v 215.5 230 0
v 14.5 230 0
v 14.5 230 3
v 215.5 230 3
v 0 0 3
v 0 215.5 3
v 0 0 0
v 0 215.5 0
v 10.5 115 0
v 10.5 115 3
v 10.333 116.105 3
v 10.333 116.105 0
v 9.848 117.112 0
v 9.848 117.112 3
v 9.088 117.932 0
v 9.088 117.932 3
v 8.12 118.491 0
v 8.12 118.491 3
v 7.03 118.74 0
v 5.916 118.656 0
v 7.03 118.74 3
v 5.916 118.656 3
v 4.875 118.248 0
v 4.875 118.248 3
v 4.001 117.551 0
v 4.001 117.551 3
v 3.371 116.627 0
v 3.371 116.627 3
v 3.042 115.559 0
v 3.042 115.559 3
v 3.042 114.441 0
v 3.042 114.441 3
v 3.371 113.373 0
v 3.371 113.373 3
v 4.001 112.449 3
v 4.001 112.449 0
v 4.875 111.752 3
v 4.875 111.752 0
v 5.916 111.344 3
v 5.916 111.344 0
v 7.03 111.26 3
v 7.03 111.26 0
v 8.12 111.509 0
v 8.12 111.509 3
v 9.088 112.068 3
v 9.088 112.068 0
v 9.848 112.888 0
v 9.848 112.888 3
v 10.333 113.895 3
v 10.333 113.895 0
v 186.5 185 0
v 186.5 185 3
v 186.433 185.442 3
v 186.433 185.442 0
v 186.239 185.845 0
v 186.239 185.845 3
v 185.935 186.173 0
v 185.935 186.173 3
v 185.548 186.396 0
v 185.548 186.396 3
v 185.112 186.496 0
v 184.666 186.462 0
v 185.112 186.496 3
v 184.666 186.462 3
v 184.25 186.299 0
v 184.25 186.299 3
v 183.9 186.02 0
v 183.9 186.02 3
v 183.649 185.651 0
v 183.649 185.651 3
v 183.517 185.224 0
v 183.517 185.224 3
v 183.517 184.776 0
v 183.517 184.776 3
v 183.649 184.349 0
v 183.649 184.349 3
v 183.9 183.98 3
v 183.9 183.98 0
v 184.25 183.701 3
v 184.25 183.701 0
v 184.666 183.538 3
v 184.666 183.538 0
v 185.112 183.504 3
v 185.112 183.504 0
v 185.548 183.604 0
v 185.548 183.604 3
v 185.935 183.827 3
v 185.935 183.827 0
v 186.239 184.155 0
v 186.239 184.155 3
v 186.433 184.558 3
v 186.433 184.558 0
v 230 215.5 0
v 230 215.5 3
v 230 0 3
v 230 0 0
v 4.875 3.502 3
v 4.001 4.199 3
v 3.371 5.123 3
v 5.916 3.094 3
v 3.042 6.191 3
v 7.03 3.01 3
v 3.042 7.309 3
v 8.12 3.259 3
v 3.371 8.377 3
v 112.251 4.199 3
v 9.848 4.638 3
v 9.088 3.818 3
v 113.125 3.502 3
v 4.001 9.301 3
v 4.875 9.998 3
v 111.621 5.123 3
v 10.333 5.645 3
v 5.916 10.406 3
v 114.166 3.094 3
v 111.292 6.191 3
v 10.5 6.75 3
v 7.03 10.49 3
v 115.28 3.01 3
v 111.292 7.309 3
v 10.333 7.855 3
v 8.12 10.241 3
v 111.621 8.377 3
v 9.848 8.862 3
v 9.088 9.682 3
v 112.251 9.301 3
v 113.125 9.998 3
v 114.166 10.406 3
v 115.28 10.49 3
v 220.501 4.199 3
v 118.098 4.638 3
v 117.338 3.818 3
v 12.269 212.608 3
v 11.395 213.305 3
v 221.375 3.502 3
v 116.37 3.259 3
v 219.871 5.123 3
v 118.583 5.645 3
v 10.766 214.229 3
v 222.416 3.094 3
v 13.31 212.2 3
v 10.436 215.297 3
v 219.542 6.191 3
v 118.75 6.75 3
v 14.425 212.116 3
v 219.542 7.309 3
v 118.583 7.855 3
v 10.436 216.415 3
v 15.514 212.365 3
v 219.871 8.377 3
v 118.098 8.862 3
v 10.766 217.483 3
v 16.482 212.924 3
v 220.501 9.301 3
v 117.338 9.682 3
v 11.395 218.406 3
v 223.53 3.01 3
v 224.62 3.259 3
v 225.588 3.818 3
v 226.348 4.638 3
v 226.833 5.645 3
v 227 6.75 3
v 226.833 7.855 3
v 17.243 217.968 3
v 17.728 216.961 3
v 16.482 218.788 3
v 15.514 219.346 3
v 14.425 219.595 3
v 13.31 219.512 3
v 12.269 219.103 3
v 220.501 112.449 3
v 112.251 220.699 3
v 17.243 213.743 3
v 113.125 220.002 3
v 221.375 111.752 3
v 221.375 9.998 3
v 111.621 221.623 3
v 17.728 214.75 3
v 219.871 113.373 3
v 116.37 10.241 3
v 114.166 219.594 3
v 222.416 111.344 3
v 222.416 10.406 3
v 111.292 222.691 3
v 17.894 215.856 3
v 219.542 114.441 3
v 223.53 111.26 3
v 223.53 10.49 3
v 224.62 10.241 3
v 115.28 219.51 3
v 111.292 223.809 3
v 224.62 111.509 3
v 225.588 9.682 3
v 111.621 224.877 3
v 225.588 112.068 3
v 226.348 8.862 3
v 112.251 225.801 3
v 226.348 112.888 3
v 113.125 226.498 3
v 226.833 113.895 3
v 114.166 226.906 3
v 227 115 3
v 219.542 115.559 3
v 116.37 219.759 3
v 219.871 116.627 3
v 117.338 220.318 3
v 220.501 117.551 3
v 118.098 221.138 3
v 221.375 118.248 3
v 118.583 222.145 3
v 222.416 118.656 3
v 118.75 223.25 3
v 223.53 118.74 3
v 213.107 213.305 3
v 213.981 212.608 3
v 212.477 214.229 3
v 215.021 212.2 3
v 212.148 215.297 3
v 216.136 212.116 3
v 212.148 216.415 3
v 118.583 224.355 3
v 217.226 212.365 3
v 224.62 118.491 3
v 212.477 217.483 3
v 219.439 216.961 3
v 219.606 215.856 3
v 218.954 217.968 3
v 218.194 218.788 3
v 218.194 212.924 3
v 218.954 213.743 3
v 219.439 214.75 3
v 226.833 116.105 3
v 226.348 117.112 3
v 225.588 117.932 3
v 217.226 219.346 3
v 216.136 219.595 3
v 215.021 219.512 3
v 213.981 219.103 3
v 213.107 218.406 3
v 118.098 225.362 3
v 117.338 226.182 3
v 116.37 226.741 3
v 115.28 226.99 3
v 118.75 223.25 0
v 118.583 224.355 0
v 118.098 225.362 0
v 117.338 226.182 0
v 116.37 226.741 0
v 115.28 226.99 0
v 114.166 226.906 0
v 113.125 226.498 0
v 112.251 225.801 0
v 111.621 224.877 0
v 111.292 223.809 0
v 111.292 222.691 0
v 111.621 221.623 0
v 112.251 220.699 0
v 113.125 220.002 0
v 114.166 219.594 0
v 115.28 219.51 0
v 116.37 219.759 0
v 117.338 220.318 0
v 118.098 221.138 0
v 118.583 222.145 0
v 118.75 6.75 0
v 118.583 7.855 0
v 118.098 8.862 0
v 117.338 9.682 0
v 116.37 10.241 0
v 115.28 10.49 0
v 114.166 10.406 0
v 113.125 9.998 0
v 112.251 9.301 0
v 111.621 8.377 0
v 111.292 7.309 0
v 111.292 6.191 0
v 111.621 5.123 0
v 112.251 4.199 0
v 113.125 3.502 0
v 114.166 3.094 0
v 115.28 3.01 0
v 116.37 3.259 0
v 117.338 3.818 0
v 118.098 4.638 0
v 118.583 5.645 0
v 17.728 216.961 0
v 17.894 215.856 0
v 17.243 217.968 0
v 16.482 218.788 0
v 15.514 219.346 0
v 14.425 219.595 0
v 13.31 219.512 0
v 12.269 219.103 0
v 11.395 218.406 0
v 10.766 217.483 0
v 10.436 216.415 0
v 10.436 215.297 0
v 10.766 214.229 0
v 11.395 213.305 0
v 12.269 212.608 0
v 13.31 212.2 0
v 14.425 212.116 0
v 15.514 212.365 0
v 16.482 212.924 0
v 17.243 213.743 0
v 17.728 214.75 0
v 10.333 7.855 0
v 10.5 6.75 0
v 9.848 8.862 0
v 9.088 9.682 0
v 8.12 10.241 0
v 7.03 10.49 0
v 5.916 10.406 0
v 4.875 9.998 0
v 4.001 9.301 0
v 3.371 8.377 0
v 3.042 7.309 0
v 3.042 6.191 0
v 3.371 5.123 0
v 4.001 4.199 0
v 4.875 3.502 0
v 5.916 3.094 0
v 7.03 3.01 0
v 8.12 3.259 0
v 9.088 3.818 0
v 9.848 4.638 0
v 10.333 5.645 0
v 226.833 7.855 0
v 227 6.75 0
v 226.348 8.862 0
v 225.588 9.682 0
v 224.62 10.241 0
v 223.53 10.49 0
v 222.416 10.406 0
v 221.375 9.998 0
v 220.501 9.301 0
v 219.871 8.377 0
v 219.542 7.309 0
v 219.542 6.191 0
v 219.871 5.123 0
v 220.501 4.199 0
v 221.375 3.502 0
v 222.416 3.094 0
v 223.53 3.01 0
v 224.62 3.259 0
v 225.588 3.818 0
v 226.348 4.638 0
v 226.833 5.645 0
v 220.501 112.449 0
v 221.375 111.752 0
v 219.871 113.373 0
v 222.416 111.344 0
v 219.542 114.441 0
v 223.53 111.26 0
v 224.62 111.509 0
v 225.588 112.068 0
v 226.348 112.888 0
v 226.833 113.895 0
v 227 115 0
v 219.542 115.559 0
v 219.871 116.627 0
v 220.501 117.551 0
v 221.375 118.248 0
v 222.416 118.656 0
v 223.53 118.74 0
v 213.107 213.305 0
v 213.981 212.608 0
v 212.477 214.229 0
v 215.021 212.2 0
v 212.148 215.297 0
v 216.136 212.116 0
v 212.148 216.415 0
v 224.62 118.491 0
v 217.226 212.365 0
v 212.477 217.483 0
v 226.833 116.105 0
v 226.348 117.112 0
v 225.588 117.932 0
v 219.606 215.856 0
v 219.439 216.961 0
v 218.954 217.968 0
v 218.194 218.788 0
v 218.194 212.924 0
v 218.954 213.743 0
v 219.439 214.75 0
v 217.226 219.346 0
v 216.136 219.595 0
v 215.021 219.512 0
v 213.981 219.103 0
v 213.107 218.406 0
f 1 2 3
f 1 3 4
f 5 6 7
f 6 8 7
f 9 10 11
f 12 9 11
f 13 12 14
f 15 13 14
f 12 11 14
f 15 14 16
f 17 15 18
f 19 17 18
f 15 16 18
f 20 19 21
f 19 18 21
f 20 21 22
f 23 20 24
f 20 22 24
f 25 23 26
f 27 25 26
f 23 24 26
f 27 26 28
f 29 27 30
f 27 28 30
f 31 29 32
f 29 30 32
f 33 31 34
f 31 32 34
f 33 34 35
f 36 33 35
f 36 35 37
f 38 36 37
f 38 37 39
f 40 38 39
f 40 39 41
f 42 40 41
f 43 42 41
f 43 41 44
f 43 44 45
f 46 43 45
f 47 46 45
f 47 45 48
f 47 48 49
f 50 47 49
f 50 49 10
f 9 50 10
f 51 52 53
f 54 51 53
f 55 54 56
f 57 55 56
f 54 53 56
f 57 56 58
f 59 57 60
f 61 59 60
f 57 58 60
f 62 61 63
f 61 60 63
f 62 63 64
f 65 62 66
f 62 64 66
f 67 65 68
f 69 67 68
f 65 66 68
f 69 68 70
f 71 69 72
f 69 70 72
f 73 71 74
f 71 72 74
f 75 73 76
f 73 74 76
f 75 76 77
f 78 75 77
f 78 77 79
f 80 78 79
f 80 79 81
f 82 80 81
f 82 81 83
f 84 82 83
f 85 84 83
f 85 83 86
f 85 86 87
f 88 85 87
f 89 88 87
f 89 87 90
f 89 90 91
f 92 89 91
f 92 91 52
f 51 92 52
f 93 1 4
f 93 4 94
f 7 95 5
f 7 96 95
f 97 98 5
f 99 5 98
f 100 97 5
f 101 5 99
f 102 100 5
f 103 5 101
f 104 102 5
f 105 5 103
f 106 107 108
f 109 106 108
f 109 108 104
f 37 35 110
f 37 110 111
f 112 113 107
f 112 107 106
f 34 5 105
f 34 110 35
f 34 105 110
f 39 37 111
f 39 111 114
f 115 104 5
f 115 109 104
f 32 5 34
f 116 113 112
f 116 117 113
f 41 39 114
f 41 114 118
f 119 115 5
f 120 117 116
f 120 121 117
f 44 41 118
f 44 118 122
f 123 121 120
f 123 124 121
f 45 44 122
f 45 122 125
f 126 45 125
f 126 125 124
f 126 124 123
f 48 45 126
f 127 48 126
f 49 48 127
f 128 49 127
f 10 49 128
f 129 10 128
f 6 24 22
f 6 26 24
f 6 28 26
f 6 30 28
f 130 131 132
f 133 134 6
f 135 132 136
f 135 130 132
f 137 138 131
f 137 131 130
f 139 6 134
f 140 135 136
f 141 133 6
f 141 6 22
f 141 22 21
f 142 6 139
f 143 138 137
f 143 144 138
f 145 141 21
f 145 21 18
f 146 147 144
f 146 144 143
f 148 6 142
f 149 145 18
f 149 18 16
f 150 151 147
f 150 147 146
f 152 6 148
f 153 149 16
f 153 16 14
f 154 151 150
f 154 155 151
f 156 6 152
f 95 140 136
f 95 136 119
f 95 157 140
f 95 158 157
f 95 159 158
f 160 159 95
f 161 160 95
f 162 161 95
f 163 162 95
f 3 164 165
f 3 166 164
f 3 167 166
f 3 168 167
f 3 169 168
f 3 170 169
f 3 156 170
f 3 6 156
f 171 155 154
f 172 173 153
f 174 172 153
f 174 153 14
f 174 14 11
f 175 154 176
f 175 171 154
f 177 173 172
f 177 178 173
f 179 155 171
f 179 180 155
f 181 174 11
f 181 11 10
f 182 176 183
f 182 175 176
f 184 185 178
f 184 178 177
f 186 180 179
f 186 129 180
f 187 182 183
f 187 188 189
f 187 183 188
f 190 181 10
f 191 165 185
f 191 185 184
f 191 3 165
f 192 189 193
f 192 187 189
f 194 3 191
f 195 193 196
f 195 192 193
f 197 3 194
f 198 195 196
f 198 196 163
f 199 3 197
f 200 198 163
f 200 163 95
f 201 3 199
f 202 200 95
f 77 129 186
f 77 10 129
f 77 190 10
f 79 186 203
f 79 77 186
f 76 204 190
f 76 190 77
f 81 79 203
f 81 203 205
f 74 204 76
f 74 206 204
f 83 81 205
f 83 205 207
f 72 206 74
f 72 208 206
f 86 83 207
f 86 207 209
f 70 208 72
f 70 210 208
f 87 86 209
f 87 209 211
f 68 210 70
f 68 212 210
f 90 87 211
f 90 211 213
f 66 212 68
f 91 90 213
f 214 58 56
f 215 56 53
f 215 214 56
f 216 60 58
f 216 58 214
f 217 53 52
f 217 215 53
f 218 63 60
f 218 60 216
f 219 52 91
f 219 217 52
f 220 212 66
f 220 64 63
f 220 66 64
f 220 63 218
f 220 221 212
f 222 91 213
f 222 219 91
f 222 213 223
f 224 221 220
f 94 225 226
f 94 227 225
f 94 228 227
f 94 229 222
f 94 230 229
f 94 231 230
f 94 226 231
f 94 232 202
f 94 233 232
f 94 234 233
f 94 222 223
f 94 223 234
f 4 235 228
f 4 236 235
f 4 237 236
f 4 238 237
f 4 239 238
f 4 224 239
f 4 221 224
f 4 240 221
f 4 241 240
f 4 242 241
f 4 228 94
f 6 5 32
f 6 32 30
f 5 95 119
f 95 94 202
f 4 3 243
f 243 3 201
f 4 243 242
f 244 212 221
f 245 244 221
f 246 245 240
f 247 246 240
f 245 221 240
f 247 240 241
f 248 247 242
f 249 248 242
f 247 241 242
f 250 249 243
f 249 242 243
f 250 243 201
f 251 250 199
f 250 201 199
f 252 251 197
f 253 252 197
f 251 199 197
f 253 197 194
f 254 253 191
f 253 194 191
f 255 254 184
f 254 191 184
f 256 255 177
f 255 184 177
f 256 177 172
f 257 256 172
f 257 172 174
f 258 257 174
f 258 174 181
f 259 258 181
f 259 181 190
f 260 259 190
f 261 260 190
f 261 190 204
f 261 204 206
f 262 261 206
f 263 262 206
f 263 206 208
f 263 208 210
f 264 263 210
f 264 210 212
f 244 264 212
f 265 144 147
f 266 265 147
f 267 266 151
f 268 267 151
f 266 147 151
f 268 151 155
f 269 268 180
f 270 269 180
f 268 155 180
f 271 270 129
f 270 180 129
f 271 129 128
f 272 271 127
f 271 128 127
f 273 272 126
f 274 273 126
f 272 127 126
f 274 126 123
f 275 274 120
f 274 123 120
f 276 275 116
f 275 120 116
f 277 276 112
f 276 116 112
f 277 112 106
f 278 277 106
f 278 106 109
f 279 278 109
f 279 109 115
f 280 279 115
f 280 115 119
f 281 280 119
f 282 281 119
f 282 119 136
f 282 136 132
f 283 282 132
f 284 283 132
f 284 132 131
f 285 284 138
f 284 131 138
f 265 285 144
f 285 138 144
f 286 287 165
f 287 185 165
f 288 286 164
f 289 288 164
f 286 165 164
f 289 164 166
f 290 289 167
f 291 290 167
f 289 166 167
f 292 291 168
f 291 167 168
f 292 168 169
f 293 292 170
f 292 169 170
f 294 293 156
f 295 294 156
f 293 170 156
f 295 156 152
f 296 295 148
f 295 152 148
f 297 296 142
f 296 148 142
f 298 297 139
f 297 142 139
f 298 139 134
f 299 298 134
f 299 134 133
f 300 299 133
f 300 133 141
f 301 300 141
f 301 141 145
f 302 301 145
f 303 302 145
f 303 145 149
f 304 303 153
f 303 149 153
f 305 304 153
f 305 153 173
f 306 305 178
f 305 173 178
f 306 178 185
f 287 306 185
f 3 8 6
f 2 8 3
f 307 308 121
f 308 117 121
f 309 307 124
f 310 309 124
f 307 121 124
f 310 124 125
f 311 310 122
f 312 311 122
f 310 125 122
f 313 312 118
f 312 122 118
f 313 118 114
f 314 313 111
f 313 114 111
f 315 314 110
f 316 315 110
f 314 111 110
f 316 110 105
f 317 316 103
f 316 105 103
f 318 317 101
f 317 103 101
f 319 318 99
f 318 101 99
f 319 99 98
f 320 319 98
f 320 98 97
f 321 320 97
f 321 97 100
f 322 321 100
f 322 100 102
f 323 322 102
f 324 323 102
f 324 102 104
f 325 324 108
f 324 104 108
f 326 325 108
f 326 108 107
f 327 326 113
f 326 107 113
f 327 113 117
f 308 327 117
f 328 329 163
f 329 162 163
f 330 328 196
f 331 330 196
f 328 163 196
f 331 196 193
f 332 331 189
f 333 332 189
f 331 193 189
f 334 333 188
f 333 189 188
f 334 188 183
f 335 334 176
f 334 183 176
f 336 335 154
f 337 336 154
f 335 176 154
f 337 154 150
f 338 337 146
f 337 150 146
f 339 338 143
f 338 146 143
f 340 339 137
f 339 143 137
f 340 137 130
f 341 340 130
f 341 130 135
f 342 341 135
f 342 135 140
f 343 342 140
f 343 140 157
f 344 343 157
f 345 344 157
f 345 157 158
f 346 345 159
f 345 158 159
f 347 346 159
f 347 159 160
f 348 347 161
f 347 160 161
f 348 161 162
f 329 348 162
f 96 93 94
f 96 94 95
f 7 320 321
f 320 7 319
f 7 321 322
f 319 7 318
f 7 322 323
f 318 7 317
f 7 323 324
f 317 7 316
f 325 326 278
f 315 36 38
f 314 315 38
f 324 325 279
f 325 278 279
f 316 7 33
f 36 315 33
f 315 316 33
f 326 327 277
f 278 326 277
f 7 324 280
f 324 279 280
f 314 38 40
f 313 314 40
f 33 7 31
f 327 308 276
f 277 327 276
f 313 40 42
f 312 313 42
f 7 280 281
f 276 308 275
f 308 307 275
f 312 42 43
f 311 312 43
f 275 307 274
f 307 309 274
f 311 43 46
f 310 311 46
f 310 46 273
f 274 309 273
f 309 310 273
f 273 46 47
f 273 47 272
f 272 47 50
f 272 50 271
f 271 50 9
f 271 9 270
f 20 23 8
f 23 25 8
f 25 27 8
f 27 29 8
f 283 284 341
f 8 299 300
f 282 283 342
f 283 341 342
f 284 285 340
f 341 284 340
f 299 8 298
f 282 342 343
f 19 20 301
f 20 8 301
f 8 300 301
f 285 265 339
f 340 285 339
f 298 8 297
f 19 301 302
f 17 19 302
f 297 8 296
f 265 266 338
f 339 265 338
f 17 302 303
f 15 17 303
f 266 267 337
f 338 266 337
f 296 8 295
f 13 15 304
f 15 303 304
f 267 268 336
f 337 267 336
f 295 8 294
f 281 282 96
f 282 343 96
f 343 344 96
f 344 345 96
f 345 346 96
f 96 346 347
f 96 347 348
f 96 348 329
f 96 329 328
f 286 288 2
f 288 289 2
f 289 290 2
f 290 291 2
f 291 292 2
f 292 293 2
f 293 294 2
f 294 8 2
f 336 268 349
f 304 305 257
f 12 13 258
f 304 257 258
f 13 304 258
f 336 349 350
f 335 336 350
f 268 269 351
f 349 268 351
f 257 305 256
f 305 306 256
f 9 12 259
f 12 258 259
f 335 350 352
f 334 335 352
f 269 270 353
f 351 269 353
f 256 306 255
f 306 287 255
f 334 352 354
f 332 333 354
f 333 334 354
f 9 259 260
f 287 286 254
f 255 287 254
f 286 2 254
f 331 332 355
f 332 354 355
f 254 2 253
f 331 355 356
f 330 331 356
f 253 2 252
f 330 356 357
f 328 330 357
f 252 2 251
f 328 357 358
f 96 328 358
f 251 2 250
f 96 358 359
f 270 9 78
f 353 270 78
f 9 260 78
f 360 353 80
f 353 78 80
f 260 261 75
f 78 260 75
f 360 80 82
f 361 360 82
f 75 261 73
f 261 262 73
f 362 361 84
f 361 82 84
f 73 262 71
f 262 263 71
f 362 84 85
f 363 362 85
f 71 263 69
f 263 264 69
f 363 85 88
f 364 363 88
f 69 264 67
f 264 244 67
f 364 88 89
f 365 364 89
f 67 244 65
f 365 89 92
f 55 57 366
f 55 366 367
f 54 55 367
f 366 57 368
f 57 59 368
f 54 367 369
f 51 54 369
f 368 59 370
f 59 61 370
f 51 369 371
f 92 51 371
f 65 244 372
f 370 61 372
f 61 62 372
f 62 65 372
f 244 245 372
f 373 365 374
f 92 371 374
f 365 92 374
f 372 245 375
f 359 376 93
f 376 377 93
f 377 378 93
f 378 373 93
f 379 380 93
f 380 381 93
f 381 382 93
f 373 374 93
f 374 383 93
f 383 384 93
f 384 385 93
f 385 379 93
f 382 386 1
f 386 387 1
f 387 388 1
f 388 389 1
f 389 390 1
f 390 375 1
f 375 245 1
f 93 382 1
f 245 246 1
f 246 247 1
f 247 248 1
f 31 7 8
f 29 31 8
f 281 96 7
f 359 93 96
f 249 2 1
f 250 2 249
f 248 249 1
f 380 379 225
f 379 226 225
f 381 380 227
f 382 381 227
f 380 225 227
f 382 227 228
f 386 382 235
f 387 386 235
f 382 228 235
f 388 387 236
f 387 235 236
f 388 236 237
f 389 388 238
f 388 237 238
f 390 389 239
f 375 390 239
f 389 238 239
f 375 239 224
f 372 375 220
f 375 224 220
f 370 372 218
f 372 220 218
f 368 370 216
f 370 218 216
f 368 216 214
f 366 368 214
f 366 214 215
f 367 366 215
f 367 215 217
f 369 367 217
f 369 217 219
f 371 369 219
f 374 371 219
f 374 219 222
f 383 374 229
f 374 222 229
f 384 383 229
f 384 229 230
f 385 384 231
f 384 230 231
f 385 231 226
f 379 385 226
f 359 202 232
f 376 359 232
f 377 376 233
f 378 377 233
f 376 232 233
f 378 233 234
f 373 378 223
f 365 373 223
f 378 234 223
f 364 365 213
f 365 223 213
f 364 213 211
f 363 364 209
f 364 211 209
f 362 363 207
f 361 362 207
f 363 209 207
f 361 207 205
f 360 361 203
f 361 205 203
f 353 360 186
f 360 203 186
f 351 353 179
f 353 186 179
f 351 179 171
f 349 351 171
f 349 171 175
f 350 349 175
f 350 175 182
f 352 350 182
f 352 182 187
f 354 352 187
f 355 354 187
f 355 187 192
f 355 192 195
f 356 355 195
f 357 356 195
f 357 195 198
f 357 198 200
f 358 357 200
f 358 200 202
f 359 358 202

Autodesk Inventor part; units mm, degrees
ref_plane "YZ Plane" through (0, 0, 0) normal (1, 0, 0) x (0, 1, 0)
ref_plane "XZ Plane" through (0, 0, 0) normal (0, 1, 0) x (-1, 0, 0)
ref_plane "XY Plane" through (0, 0, 0) normal (0, 0, 1) x (1, 0, 0)
sketch "Sketch1" plane through (0, 0, 0) normal (0, 0, 1) x (1, 0, 0)
  line L0 (230, 0) -> (0, 0)
  line L1 (14.5, 230) -> (215.5, 230)
  line L2 (0, 215.5) -> (0, 0)
  line L3 (0, 215.5) -> (14.5, 230)
  line L4 (230, 215.5) -> (230, 0)
  line L5 (215.5, 230) -> (230, 215.5)
  dimension "d6" = 135
  dimension "d7" = 230
  dimension "d8" = 230
  dimension "d9" = 315.0161
  dimension "d10" = 152.3815
extrude "Extrusion1" add sketch "Sketch1" along normal blind 3
sketch "Sketch2" plane through (0, 0, 3) normal (0, 0, 1) x (1, 0, 0)
  line L0 (215.5, 230) -> (14.5, 230) projected
  circle A0 centre (115, 223.25) radius 3.75
  line L1 (0, 0) -> (230, 0) projected
  circle A1 centre (115, 6.75) radius 3.75
  line L2 (0, 215.5) -> (0, 0) projected
  circle A2 centre (6.75, 115) radius 3.75
  line L3 (230, 0) -> (230, 215.5) projected
  circle A3 centre (223.25, 115) radius 3.75
  circle A4 centre (6.75, 6.75) radius 3.75
  circle A5 centre (223.25, 6.75) radius 3.75
  line L4 (14.5, 230) -> (0, 215.5) projected
  circle A6 centre (14.1443, 215.8557) radius 3.75
  line L5 (230, 215.5) -> (215.5, 230) projected
  circle A7 centre (215.8557, 215.8557) radius 3.75
  circle A8 centre (185, 185) radius 1.5
  dimension "d19" = 7.5
  dimension "d21" = 7.5
  dimension "d23" = 7.5
  dimension "d25" = 7.5
  dimension "d28" = 7.5
  dimension "d31" = 7.5
  dimension "d34" = 7.5
  dimension "d37" = 7.5
  dimension "d43" = 3
extrude "Extrusion2" cut sketch "Sketch2" against normal through all contours A0 | A1 | A2 | A3 | A4 | A5 | A6 | A7 | A8
properties part number "tampa da caixa de engrenagem"
